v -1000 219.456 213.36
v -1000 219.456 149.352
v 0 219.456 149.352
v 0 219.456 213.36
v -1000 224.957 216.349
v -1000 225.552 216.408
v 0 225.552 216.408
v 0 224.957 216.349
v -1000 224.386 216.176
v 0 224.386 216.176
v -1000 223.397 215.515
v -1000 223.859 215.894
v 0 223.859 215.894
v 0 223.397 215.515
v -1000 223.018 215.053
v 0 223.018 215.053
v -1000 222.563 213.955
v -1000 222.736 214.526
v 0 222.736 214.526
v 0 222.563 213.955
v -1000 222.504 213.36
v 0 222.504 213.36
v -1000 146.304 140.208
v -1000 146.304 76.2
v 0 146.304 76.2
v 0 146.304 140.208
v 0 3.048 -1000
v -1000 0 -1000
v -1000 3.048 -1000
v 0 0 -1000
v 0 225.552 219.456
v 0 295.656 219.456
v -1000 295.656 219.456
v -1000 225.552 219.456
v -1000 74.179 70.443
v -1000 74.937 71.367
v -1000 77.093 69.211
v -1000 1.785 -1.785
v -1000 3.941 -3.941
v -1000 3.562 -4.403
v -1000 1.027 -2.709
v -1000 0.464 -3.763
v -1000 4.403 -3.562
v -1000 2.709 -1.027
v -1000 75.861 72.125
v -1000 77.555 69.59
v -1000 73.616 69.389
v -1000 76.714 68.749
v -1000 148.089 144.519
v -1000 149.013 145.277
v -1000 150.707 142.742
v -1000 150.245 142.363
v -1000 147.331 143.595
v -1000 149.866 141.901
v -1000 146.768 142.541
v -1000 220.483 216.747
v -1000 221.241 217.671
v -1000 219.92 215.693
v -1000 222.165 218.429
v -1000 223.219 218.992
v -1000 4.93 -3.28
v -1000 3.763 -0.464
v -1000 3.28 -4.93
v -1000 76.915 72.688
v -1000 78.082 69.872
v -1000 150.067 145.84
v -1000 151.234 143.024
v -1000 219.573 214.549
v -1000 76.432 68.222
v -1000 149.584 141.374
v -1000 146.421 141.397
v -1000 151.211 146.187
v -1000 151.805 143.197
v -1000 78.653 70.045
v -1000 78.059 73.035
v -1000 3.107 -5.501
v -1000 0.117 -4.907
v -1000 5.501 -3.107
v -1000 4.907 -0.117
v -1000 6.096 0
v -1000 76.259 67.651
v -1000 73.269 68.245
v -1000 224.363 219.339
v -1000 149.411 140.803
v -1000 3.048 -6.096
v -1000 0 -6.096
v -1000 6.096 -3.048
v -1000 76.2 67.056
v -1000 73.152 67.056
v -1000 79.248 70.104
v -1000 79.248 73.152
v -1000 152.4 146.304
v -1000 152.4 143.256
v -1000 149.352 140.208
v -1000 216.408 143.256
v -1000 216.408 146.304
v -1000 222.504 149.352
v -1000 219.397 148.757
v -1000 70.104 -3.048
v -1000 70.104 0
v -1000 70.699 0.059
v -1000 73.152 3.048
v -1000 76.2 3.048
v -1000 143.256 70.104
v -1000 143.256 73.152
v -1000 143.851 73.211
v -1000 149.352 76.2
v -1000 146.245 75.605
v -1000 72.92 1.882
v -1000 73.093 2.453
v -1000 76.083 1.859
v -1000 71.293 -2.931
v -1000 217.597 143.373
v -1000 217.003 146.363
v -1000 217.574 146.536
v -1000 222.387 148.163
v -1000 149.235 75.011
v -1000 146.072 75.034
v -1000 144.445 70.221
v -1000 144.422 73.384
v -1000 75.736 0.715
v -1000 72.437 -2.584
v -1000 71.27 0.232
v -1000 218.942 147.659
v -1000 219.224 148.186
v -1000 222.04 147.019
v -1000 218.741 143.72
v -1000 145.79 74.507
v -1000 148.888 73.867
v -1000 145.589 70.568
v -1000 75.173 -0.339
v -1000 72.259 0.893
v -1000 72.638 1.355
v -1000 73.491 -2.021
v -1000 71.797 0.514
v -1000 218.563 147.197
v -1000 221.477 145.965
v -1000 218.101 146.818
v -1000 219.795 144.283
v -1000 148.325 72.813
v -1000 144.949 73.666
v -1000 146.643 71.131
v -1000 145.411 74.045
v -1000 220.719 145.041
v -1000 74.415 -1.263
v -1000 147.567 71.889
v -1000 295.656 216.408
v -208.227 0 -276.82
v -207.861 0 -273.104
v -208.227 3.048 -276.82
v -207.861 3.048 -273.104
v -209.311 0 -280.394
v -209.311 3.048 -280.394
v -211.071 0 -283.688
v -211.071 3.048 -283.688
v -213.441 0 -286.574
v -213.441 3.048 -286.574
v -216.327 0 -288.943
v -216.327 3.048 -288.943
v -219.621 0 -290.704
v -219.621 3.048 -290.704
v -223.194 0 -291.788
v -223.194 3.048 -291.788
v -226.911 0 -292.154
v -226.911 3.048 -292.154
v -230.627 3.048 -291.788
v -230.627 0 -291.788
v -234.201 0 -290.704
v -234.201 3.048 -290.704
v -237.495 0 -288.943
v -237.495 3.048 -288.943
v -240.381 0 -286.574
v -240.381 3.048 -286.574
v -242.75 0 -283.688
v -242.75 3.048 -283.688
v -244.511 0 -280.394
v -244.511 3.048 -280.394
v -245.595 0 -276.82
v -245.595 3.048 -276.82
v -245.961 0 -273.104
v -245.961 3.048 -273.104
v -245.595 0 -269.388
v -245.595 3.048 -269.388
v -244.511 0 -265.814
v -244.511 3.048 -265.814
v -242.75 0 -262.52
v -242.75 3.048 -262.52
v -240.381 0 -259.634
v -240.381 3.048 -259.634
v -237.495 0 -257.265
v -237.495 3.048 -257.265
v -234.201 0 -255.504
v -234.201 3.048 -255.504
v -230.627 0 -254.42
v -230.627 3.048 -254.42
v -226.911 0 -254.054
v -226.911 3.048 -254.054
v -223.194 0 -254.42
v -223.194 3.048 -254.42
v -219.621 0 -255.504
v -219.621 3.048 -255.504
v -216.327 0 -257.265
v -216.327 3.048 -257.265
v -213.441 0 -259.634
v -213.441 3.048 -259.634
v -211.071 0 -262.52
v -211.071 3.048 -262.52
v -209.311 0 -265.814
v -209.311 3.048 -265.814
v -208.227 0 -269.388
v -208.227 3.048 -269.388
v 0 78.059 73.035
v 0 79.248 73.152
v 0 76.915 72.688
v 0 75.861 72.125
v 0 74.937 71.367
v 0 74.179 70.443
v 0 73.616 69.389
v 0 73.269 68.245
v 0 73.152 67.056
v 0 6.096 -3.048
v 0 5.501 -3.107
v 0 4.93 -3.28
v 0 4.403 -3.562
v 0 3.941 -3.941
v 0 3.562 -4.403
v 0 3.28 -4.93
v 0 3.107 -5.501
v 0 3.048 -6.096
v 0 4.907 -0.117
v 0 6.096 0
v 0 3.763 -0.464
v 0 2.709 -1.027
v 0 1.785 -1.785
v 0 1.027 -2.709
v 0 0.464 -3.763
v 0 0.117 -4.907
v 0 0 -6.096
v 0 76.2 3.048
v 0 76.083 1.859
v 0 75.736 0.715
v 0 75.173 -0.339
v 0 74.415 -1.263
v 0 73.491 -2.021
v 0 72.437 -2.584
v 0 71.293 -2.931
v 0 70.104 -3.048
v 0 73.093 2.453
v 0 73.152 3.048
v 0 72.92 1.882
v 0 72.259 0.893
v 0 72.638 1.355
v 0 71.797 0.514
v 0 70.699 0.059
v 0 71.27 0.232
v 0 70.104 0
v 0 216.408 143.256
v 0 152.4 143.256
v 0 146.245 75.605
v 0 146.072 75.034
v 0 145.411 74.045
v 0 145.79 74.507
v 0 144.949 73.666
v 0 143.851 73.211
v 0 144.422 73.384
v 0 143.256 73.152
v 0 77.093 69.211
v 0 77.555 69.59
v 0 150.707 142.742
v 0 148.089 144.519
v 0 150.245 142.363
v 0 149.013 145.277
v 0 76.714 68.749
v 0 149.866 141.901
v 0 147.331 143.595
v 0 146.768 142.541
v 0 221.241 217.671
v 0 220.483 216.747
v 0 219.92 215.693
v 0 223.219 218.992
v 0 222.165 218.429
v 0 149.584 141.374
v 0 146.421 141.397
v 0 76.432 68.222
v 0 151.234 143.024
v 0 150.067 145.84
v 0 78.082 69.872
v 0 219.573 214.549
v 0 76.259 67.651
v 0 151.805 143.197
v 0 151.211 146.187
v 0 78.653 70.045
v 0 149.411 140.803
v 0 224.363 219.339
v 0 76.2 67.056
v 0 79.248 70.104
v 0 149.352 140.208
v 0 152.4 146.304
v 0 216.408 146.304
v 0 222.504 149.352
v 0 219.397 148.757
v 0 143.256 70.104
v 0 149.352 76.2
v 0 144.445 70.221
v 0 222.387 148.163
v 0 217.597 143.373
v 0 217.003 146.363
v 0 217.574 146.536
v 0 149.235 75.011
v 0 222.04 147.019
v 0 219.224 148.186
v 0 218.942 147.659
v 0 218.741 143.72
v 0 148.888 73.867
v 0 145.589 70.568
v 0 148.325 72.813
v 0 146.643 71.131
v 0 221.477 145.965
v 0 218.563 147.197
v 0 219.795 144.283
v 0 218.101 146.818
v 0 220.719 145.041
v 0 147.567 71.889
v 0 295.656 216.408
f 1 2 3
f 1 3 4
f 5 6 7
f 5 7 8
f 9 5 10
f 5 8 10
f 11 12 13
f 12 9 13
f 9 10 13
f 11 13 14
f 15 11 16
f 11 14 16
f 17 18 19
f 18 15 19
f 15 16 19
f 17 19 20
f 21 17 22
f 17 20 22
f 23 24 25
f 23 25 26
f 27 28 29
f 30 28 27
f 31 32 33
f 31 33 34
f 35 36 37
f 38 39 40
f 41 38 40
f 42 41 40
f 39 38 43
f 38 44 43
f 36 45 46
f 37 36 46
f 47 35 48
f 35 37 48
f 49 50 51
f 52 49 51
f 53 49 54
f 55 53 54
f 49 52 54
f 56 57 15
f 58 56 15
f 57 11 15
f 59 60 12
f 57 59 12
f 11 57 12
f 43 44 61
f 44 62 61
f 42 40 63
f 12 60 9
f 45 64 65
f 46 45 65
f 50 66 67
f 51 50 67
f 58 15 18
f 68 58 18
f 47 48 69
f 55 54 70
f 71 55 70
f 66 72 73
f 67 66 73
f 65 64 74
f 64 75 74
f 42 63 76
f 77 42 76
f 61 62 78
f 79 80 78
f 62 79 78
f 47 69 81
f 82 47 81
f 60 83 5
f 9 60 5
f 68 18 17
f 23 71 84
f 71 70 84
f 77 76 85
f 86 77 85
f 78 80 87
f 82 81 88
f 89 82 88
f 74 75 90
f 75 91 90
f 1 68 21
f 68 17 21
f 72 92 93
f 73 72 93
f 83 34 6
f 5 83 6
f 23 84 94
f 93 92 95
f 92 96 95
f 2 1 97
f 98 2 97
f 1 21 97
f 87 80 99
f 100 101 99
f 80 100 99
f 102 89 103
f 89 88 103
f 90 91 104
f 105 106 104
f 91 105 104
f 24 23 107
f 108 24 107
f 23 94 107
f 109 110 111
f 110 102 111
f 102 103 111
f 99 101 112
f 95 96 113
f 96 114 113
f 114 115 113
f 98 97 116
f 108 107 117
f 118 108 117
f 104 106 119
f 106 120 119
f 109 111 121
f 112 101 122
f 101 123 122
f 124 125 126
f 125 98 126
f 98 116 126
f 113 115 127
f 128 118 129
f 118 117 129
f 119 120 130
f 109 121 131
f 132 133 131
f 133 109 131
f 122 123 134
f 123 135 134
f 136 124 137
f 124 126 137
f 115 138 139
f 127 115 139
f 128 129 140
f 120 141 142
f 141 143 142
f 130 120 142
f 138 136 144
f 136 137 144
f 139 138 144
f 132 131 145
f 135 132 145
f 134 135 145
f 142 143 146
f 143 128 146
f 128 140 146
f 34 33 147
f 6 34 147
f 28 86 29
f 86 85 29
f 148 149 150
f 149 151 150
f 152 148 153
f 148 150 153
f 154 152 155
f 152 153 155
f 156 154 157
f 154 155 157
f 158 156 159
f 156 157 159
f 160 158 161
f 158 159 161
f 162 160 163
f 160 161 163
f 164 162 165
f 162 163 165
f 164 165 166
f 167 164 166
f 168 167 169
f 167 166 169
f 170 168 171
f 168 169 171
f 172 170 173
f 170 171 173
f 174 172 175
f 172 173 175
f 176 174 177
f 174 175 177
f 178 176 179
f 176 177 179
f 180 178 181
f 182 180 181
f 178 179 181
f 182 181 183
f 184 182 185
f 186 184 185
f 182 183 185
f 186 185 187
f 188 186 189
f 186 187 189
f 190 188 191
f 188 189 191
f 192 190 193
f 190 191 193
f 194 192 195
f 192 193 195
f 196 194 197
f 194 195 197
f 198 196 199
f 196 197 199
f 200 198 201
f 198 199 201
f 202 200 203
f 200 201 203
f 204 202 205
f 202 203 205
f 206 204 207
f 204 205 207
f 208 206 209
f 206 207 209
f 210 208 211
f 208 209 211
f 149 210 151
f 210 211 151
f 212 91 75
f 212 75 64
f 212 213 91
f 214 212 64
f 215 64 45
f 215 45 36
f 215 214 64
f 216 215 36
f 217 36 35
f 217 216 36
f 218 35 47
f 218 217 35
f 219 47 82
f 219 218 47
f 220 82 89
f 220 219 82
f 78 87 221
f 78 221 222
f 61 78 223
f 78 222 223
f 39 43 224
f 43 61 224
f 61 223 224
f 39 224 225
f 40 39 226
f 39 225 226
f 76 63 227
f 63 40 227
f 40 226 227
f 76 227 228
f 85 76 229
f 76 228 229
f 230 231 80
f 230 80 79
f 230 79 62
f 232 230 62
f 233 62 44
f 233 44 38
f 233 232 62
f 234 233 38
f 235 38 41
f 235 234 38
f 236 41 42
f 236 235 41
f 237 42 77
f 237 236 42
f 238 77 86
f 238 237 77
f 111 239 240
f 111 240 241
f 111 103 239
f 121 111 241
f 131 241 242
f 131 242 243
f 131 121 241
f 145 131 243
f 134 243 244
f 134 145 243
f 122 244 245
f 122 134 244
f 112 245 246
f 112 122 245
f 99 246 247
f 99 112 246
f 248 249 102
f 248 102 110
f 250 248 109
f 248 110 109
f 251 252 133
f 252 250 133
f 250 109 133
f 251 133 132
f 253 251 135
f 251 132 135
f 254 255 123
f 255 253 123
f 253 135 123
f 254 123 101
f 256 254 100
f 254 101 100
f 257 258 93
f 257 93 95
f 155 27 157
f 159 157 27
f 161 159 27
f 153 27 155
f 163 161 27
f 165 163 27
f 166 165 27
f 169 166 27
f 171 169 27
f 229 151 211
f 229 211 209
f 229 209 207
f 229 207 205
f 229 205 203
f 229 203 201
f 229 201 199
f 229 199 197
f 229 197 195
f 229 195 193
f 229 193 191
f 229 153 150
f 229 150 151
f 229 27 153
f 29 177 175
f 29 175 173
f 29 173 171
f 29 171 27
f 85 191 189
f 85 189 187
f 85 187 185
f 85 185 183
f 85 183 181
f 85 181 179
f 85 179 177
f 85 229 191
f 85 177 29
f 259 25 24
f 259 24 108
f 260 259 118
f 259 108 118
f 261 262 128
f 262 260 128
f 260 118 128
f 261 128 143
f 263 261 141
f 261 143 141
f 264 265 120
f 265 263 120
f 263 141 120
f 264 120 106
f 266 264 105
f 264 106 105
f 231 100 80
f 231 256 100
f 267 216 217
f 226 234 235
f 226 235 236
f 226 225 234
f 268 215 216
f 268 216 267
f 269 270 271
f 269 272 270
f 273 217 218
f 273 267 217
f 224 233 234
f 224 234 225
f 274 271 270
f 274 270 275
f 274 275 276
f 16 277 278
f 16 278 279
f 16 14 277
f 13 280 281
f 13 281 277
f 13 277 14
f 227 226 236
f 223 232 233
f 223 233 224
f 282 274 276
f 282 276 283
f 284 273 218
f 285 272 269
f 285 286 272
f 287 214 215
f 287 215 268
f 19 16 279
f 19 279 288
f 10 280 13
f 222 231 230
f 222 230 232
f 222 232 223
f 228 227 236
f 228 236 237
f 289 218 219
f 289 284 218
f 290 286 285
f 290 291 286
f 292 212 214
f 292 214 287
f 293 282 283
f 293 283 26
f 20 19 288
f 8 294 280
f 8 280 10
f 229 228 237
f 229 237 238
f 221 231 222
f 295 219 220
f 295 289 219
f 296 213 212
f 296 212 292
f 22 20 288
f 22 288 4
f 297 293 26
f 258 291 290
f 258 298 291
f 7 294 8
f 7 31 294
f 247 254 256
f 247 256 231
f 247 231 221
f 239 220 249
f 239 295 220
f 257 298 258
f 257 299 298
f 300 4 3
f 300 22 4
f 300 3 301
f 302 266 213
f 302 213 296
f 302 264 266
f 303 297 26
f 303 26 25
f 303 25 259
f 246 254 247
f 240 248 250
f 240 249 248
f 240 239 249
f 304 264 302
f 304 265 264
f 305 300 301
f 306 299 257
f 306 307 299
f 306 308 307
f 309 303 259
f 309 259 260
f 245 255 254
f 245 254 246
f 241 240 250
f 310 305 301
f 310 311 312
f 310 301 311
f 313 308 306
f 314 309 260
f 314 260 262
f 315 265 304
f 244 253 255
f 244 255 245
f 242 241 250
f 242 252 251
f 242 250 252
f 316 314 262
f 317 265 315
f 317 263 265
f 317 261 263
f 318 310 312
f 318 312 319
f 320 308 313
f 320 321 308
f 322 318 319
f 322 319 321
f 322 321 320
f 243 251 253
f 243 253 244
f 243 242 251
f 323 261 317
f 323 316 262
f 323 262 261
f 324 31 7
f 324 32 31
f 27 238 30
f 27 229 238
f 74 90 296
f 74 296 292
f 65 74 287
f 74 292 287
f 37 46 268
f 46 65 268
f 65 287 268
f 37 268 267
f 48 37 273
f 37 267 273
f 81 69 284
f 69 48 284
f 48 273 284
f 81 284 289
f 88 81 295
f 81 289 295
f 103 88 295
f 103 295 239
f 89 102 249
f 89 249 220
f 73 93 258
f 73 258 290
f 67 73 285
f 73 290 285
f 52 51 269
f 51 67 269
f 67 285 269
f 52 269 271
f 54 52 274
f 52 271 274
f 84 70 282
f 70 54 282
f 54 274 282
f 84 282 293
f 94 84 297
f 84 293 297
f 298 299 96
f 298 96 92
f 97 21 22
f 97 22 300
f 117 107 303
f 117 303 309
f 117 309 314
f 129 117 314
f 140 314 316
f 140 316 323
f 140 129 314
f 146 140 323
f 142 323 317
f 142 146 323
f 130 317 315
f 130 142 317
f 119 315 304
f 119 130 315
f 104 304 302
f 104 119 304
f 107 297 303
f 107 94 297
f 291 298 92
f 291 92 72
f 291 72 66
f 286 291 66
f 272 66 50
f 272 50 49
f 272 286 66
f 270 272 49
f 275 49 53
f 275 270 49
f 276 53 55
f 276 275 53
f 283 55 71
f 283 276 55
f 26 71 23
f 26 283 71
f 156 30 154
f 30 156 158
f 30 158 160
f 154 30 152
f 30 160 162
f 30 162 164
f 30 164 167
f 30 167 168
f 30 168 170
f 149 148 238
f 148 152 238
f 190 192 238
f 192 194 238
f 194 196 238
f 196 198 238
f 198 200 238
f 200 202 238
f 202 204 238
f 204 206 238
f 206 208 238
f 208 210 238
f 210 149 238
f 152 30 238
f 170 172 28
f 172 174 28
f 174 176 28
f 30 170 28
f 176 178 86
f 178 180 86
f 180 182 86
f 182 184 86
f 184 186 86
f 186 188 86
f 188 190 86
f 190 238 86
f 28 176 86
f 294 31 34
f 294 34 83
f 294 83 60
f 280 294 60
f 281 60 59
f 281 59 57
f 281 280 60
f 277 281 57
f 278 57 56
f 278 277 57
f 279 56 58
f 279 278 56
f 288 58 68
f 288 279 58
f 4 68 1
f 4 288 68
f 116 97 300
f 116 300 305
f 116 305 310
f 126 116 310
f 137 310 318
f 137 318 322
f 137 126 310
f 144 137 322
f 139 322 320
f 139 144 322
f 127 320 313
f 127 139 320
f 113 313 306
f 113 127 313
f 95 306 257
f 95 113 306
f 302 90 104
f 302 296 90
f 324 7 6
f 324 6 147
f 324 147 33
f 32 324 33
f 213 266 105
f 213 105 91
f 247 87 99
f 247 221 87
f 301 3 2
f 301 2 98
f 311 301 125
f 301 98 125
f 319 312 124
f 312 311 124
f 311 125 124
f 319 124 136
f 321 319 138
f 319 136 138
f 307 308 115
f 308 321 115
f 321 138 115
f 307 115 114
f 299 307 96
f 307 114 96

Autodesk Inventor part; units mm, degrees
ref_plane "YZ Plane" through (0, 0, 0) normal (1, 0, 0) x (0, 1, 0)
ref_plane "XZ Plane" through (0, 0, 0) normal (0, 1, 0) x (-1, 0, 0)
ref_plane "XY Plane" through (0, 0, 0) normal (0, 0, 1) x (1, 0, 0)
sketch "Sketch1" plane through (0, 0, 0) normal (0, 1, 0) x (-1, 0, 0)
  line L0 (0, 0) -> (1000, 0)
  line L1 (1000, 0) -> (1000, -1000)
  line L2 (1000, -1000) -> (0, -1000)
  line L3 (0, -1000) -> (0, 0)
  dimension "d0" = 1000
  dimension "d1" = 1000
extrude "Plate1" add sketch "Sketch1" along normal blind 3.048
sketch "Sketch2" plane through (0, 3.048, 0) normal (0, 1, 0) x (1, 0, 0)
  line L0 (-1000, 0) -> (0, 0) projected
  line L1 (0, 0) -> (-226.9109, 0)
  line L2 (-226.9109, 0) -> (-226.9109, 273.104)
  line L3 (-226.9109, 273.104) -> (0, 273.104)
  line L4 (0, 273.104) -> (0, 0)
  circle A0 centre (-226.9109, 273.104) radius 19.05
  dimension "d3" = 38.1
extrude "Cut1" cut sketch "Sketch2" against normal blind 3.048 contours A0 L3 L2 | L2 L3 A0
sketch "Sketch3" plane through (0, 0, -3.048) normal (0, 0, 1) x (1, 0, 0)
  line L0 (-1000, 0) -> (0, 0)
  line L1 (0, 0) -> (0, 76.2)
  line L2 (0, 76.2) -> (-1000, 76.2)
  line L3 (-1000, 76.2) -> (-1000, 0)
edge flange "Flange1" height 76.2 angle 90 thickness 3.048 bend radius 3.048 thickness toward (0, 0, 1) relief tear relief width 3.048 relief depth 1.524 edges at (-500, 3.048, 0) wall of the first edge with corners at (-1000, 0, -3.048) (0, 0, -3.048) (0, 76.2, -3.048) (-1000, 76.2, -3.048)
bend "Bend1"
corner "Corner1"
sketch "Sketch4" plane through (-1000, 73.152, -3.048) normal (0, 1, 0) x (-1, 0, 0)
  line L0 (-1000, 0) -> (0, 0)
  line L1 (0, 0) -> (0, 76.2)
  line L2 (0, 76.2) -> (-1000, 76.2)
  line L3 (-1000, 76.2) -> (-1000, 0)
edge flange "Flange2" height 76.2 angle 90 thickness 3.048 bend radius 3.048 thickness toward (0, 1, 0) relief tear relief width 3.048 relief depth 1.524 edges at (-500, 76.2, 0) wall of the first edge with corners at (0, 73.152, -3.048) (-1000, 73.152, -3.048) (-1000, 73.152, 73.152) (0, 73.152, 73.152)
bend "Bend2"
corner "Corner2"
sketch "Sketch5" plane through (0, 73.152, 70.104) normal (0, 0, 1) x (1, 0, 0)
  line L0 (-1000, 0) -> (0, 0)
  line L1 (0, 0) -> (0, 76.2)
  line L2 (0, 76.2) -> (-1000, 76.2)
  line L3 (-1000, 76.2) -> (-1000, 0)
edge flange "Flange3" height 76.2 angle 90 thickness 3.048 bend radius 3.048 thickness toward (0, 0, 1) relief tear relief width 3.048 relief depth 1.524 edges at (-500, 76.2, 73.152) wall of the first edge with corners at (-1000, 73.152, 70.104) (0, 73.152, 70.104) (0, 149.352, 70.104) (-1000, 149.352, 70.104)
bend "Bend3"
corner "Corner3"
sketch "Sketch6" plane through (-1000, 146.304, 70.104) normal (0, 1, 0) x (-1, 0, 0)
  line L0 (-1000, 0) -> (0, 0)
  line L1 (0, 0) -> (0, 76.2)
  line L2 (0, 76.2) -> (-1000, 76.2)
  line L3 (-1000, 76.2) -> (-1000, 0)
edge flange "Flange4" height 76.2 angle 90 thickness 3.048 bend radius 3.048 thickness toward (0, 1, 0) relief tear relief width 3.048 relief depth 1.524 edges at (-500, 149.352, 73.152) wall of the first edge with corners at (0, 146.304, 70.104) (-1000, 146.304, 70.104) (-1000, 146.304, 146.304) (0, 146.304, 146.304)
bend "Bend4"
corner "Corner4"
sketch "Sketch7" plane through (0, 146.304, 143.256) normal (0, 0, 1) x (1, 0, 0)
  line L0 (-1000, 0) -> (0, 0)
  line L1 (0, 0) -> (0, 76.2)
  line L2 (0, 76.2) -> (-1000, 76.2)
  line L3 (-1000, 76.2) -> (-1000, 0)
edge flange "Flange5" height 76.2 angle 90 thickness 3.048 bend radius 3.048 thickness toward (0, 0, 1) relief tear relief width 3.048 relief depth 1.524 edges at (-500, 149.352, 146.304) wall of the first edge with corners at (-1000, 146.304, 143.256) (0, 146.304, 143.256) (0, 222.504, 143.256) (-1000, 222.504, 143.256)
bend "Bend5"
corner "Corner5"
sketch "Sketch8" plane through (-1000, 222.504, 146.304) normal (0, 1, 0) x (1, 0, 0)
  point P0 (1000, 146.304)
sketch "Sketch9" plane through (-1000, 219.456, 143.256) normal (0, 1, 0) x (-1, 0, 0)
  line L0 (-1000, 0) -> (0, 0)
  line L1 (0, 0) -> (0, 76.2)
  line L2 (0, 76.2) -> (-1000, 76.2)
  line L3 (-1000, 76.2) -> (-1000, 0)
edge flange "Flange6" height 76.2 angle 90 thickness 3.048 bend radius 3.048 thickness toward (0, 1, 0) relief tear relief width 3.048 relief depth 1.524 edges at (-500, 222.504, 146.304) wall of the first edge with corners at (0, 219.456, 143.256) (-1000, 219.456, 143.256) (-1000, 219.456, 219.456) (0, 219.456, 219.456)
bend "Bend6"
corner "Corner6"
sketch "Sketch10" plane through (0, 219.456, 216.408) normal (0, 0, 1) x (1, 0, 0)
  line L0 (-1000, 0) -> (0, 0)
  line L1 (0, 0) -> (0, 76.2)
  line L2 (0, 76.2) -> (-1000, 76.2)
  line L3 (-1000, 76.2) -> (-1000, 0)
edge flange "Flange7" height 76.2 angle 90 thickness 3.048 bend radius 3.048 thickness toward (0, 0, 1) relief tear relief width 3.048 relief depth 1.524 edges at (-500, 222.504, 219.456) wall of the first edge with corners at (-1000, 219.456, 216.408) (0, 219.456, 216.408) (0, 295.656, 216.408) (-1000, 295.656, 216.408)
bend "Bend7"
corner "Corner7"
equation "\"d4\" = Thickness"
equation "\"d2\" = Thickness"
equation "\"d6\" = BendReliefWidth"
equation "\"d7\" = BendReliefDepth"
equation "\"d8\" = MinimumRemnant"
equation "\"d9\" = TransitionRadius"
equation "\"d12\" = BendRadius"
equation "\"d13\" = CornerReliefSize"
equation "\"d14\" = GapSize"
equation "\"d15\" = JacobiRadiusSize"
equation "\"d16\" = BendReliefWidth"
equation "\"d17\" = BendReliefDepth"
equation "\"d18\" = MinimumRemnant"
equation "\"d19\" = TransitionRadius"
equation "\"d22\" = BendRadius"
equation "\"d23\" = CornerReliefSize"
equation "\"d24\" = GapSize"
equation "\"d25\" = JacobiRadiusSize"
equation "\"d26\" = BendReliefWidth"
equation "\"d27\" = BendReliefDepth"
equation "\"d28\" = MinimumRemnant"
equation "\"d29\" = TransitionRadius"
equation "\"d32\" = BendRadius"
equation "\"d33\" = CornerReliefSize"
equation "\"d34\" = GapSize"
equation "\"d35\" = JacobiRadiusSize"
equation "\"d36\" = BendReliefWidth"
equation "\"d37\" = BendReliefDepth"
equation "\"d38\" = MinimumRemnant"
equation "\"d39\" = TransitionRadius"
equation "\"d42\" = BendRadius"
equation "\"d43\" = CornerReliefSize"
equation "\"d44\" = GapSize"
equation "\"d45\" = JacobiRadiusSize"
equation "\"d46\" = BendReliefWidth"
equation "\"d47\" = BendReliefDepth"
equation "\"d48\" = MinimumRemnant"
equation "\"d49\" = TransitionRadius"
equation "\"d52\" = BendRadius"
equation "\"d53\" = CornerReliefSize"
equation "\"d54\" = GapSize"
equation "\"d55\" = JacobiRadiusSize"
equation "\"d56\" = BendReliefWidth"
equation "\"d57\" = BendReliefDepth"
equation "\"d58\" = MinimumRemnant"
equation "\"d59\" = TransitionRadius"
equation "\"d62\" = BendRadius"
equation "\"d63\" = CornerReliefSize"
equation "\"d64\" = GapSize"
equation "\"d65\" = JacobiRadiusSize"
equation "\"d66\" = BendReliefWidth"
equation "\"d67\" = BendReliefDepth"
equation "\"d68\" = MinimumRemnant"
equation "\"d69\" = TransitionRadius"
equation "\"d72\" = BendRadius"
equation "\"d73\" = CornerReliefSize"
equation "\"d74\" = GapSize"
equation "\"d75\" = JacobiRadiusSize"
equation "\"BendRadius\" = Thickness"
equation "\"BendReliefWidth\" = Thickness"
equation "\"BendReliefDepth\" = 0.5 * Thickness"
equation "\"CornerReliefSize\" = 4 * Thickness"
equation "\"MinimumRemnant\" = 2 * Thickness"
equation "\"TransitionRadius\" = BendRadius"
equation "\"JacobiRadiusSize\" = BendRadius"
equation "\"GapSize\" = Thickness"
equation "\"Thickness\" = 3.048"
properties part number "Floor, Shower" material "Polyethylene, High Density"
